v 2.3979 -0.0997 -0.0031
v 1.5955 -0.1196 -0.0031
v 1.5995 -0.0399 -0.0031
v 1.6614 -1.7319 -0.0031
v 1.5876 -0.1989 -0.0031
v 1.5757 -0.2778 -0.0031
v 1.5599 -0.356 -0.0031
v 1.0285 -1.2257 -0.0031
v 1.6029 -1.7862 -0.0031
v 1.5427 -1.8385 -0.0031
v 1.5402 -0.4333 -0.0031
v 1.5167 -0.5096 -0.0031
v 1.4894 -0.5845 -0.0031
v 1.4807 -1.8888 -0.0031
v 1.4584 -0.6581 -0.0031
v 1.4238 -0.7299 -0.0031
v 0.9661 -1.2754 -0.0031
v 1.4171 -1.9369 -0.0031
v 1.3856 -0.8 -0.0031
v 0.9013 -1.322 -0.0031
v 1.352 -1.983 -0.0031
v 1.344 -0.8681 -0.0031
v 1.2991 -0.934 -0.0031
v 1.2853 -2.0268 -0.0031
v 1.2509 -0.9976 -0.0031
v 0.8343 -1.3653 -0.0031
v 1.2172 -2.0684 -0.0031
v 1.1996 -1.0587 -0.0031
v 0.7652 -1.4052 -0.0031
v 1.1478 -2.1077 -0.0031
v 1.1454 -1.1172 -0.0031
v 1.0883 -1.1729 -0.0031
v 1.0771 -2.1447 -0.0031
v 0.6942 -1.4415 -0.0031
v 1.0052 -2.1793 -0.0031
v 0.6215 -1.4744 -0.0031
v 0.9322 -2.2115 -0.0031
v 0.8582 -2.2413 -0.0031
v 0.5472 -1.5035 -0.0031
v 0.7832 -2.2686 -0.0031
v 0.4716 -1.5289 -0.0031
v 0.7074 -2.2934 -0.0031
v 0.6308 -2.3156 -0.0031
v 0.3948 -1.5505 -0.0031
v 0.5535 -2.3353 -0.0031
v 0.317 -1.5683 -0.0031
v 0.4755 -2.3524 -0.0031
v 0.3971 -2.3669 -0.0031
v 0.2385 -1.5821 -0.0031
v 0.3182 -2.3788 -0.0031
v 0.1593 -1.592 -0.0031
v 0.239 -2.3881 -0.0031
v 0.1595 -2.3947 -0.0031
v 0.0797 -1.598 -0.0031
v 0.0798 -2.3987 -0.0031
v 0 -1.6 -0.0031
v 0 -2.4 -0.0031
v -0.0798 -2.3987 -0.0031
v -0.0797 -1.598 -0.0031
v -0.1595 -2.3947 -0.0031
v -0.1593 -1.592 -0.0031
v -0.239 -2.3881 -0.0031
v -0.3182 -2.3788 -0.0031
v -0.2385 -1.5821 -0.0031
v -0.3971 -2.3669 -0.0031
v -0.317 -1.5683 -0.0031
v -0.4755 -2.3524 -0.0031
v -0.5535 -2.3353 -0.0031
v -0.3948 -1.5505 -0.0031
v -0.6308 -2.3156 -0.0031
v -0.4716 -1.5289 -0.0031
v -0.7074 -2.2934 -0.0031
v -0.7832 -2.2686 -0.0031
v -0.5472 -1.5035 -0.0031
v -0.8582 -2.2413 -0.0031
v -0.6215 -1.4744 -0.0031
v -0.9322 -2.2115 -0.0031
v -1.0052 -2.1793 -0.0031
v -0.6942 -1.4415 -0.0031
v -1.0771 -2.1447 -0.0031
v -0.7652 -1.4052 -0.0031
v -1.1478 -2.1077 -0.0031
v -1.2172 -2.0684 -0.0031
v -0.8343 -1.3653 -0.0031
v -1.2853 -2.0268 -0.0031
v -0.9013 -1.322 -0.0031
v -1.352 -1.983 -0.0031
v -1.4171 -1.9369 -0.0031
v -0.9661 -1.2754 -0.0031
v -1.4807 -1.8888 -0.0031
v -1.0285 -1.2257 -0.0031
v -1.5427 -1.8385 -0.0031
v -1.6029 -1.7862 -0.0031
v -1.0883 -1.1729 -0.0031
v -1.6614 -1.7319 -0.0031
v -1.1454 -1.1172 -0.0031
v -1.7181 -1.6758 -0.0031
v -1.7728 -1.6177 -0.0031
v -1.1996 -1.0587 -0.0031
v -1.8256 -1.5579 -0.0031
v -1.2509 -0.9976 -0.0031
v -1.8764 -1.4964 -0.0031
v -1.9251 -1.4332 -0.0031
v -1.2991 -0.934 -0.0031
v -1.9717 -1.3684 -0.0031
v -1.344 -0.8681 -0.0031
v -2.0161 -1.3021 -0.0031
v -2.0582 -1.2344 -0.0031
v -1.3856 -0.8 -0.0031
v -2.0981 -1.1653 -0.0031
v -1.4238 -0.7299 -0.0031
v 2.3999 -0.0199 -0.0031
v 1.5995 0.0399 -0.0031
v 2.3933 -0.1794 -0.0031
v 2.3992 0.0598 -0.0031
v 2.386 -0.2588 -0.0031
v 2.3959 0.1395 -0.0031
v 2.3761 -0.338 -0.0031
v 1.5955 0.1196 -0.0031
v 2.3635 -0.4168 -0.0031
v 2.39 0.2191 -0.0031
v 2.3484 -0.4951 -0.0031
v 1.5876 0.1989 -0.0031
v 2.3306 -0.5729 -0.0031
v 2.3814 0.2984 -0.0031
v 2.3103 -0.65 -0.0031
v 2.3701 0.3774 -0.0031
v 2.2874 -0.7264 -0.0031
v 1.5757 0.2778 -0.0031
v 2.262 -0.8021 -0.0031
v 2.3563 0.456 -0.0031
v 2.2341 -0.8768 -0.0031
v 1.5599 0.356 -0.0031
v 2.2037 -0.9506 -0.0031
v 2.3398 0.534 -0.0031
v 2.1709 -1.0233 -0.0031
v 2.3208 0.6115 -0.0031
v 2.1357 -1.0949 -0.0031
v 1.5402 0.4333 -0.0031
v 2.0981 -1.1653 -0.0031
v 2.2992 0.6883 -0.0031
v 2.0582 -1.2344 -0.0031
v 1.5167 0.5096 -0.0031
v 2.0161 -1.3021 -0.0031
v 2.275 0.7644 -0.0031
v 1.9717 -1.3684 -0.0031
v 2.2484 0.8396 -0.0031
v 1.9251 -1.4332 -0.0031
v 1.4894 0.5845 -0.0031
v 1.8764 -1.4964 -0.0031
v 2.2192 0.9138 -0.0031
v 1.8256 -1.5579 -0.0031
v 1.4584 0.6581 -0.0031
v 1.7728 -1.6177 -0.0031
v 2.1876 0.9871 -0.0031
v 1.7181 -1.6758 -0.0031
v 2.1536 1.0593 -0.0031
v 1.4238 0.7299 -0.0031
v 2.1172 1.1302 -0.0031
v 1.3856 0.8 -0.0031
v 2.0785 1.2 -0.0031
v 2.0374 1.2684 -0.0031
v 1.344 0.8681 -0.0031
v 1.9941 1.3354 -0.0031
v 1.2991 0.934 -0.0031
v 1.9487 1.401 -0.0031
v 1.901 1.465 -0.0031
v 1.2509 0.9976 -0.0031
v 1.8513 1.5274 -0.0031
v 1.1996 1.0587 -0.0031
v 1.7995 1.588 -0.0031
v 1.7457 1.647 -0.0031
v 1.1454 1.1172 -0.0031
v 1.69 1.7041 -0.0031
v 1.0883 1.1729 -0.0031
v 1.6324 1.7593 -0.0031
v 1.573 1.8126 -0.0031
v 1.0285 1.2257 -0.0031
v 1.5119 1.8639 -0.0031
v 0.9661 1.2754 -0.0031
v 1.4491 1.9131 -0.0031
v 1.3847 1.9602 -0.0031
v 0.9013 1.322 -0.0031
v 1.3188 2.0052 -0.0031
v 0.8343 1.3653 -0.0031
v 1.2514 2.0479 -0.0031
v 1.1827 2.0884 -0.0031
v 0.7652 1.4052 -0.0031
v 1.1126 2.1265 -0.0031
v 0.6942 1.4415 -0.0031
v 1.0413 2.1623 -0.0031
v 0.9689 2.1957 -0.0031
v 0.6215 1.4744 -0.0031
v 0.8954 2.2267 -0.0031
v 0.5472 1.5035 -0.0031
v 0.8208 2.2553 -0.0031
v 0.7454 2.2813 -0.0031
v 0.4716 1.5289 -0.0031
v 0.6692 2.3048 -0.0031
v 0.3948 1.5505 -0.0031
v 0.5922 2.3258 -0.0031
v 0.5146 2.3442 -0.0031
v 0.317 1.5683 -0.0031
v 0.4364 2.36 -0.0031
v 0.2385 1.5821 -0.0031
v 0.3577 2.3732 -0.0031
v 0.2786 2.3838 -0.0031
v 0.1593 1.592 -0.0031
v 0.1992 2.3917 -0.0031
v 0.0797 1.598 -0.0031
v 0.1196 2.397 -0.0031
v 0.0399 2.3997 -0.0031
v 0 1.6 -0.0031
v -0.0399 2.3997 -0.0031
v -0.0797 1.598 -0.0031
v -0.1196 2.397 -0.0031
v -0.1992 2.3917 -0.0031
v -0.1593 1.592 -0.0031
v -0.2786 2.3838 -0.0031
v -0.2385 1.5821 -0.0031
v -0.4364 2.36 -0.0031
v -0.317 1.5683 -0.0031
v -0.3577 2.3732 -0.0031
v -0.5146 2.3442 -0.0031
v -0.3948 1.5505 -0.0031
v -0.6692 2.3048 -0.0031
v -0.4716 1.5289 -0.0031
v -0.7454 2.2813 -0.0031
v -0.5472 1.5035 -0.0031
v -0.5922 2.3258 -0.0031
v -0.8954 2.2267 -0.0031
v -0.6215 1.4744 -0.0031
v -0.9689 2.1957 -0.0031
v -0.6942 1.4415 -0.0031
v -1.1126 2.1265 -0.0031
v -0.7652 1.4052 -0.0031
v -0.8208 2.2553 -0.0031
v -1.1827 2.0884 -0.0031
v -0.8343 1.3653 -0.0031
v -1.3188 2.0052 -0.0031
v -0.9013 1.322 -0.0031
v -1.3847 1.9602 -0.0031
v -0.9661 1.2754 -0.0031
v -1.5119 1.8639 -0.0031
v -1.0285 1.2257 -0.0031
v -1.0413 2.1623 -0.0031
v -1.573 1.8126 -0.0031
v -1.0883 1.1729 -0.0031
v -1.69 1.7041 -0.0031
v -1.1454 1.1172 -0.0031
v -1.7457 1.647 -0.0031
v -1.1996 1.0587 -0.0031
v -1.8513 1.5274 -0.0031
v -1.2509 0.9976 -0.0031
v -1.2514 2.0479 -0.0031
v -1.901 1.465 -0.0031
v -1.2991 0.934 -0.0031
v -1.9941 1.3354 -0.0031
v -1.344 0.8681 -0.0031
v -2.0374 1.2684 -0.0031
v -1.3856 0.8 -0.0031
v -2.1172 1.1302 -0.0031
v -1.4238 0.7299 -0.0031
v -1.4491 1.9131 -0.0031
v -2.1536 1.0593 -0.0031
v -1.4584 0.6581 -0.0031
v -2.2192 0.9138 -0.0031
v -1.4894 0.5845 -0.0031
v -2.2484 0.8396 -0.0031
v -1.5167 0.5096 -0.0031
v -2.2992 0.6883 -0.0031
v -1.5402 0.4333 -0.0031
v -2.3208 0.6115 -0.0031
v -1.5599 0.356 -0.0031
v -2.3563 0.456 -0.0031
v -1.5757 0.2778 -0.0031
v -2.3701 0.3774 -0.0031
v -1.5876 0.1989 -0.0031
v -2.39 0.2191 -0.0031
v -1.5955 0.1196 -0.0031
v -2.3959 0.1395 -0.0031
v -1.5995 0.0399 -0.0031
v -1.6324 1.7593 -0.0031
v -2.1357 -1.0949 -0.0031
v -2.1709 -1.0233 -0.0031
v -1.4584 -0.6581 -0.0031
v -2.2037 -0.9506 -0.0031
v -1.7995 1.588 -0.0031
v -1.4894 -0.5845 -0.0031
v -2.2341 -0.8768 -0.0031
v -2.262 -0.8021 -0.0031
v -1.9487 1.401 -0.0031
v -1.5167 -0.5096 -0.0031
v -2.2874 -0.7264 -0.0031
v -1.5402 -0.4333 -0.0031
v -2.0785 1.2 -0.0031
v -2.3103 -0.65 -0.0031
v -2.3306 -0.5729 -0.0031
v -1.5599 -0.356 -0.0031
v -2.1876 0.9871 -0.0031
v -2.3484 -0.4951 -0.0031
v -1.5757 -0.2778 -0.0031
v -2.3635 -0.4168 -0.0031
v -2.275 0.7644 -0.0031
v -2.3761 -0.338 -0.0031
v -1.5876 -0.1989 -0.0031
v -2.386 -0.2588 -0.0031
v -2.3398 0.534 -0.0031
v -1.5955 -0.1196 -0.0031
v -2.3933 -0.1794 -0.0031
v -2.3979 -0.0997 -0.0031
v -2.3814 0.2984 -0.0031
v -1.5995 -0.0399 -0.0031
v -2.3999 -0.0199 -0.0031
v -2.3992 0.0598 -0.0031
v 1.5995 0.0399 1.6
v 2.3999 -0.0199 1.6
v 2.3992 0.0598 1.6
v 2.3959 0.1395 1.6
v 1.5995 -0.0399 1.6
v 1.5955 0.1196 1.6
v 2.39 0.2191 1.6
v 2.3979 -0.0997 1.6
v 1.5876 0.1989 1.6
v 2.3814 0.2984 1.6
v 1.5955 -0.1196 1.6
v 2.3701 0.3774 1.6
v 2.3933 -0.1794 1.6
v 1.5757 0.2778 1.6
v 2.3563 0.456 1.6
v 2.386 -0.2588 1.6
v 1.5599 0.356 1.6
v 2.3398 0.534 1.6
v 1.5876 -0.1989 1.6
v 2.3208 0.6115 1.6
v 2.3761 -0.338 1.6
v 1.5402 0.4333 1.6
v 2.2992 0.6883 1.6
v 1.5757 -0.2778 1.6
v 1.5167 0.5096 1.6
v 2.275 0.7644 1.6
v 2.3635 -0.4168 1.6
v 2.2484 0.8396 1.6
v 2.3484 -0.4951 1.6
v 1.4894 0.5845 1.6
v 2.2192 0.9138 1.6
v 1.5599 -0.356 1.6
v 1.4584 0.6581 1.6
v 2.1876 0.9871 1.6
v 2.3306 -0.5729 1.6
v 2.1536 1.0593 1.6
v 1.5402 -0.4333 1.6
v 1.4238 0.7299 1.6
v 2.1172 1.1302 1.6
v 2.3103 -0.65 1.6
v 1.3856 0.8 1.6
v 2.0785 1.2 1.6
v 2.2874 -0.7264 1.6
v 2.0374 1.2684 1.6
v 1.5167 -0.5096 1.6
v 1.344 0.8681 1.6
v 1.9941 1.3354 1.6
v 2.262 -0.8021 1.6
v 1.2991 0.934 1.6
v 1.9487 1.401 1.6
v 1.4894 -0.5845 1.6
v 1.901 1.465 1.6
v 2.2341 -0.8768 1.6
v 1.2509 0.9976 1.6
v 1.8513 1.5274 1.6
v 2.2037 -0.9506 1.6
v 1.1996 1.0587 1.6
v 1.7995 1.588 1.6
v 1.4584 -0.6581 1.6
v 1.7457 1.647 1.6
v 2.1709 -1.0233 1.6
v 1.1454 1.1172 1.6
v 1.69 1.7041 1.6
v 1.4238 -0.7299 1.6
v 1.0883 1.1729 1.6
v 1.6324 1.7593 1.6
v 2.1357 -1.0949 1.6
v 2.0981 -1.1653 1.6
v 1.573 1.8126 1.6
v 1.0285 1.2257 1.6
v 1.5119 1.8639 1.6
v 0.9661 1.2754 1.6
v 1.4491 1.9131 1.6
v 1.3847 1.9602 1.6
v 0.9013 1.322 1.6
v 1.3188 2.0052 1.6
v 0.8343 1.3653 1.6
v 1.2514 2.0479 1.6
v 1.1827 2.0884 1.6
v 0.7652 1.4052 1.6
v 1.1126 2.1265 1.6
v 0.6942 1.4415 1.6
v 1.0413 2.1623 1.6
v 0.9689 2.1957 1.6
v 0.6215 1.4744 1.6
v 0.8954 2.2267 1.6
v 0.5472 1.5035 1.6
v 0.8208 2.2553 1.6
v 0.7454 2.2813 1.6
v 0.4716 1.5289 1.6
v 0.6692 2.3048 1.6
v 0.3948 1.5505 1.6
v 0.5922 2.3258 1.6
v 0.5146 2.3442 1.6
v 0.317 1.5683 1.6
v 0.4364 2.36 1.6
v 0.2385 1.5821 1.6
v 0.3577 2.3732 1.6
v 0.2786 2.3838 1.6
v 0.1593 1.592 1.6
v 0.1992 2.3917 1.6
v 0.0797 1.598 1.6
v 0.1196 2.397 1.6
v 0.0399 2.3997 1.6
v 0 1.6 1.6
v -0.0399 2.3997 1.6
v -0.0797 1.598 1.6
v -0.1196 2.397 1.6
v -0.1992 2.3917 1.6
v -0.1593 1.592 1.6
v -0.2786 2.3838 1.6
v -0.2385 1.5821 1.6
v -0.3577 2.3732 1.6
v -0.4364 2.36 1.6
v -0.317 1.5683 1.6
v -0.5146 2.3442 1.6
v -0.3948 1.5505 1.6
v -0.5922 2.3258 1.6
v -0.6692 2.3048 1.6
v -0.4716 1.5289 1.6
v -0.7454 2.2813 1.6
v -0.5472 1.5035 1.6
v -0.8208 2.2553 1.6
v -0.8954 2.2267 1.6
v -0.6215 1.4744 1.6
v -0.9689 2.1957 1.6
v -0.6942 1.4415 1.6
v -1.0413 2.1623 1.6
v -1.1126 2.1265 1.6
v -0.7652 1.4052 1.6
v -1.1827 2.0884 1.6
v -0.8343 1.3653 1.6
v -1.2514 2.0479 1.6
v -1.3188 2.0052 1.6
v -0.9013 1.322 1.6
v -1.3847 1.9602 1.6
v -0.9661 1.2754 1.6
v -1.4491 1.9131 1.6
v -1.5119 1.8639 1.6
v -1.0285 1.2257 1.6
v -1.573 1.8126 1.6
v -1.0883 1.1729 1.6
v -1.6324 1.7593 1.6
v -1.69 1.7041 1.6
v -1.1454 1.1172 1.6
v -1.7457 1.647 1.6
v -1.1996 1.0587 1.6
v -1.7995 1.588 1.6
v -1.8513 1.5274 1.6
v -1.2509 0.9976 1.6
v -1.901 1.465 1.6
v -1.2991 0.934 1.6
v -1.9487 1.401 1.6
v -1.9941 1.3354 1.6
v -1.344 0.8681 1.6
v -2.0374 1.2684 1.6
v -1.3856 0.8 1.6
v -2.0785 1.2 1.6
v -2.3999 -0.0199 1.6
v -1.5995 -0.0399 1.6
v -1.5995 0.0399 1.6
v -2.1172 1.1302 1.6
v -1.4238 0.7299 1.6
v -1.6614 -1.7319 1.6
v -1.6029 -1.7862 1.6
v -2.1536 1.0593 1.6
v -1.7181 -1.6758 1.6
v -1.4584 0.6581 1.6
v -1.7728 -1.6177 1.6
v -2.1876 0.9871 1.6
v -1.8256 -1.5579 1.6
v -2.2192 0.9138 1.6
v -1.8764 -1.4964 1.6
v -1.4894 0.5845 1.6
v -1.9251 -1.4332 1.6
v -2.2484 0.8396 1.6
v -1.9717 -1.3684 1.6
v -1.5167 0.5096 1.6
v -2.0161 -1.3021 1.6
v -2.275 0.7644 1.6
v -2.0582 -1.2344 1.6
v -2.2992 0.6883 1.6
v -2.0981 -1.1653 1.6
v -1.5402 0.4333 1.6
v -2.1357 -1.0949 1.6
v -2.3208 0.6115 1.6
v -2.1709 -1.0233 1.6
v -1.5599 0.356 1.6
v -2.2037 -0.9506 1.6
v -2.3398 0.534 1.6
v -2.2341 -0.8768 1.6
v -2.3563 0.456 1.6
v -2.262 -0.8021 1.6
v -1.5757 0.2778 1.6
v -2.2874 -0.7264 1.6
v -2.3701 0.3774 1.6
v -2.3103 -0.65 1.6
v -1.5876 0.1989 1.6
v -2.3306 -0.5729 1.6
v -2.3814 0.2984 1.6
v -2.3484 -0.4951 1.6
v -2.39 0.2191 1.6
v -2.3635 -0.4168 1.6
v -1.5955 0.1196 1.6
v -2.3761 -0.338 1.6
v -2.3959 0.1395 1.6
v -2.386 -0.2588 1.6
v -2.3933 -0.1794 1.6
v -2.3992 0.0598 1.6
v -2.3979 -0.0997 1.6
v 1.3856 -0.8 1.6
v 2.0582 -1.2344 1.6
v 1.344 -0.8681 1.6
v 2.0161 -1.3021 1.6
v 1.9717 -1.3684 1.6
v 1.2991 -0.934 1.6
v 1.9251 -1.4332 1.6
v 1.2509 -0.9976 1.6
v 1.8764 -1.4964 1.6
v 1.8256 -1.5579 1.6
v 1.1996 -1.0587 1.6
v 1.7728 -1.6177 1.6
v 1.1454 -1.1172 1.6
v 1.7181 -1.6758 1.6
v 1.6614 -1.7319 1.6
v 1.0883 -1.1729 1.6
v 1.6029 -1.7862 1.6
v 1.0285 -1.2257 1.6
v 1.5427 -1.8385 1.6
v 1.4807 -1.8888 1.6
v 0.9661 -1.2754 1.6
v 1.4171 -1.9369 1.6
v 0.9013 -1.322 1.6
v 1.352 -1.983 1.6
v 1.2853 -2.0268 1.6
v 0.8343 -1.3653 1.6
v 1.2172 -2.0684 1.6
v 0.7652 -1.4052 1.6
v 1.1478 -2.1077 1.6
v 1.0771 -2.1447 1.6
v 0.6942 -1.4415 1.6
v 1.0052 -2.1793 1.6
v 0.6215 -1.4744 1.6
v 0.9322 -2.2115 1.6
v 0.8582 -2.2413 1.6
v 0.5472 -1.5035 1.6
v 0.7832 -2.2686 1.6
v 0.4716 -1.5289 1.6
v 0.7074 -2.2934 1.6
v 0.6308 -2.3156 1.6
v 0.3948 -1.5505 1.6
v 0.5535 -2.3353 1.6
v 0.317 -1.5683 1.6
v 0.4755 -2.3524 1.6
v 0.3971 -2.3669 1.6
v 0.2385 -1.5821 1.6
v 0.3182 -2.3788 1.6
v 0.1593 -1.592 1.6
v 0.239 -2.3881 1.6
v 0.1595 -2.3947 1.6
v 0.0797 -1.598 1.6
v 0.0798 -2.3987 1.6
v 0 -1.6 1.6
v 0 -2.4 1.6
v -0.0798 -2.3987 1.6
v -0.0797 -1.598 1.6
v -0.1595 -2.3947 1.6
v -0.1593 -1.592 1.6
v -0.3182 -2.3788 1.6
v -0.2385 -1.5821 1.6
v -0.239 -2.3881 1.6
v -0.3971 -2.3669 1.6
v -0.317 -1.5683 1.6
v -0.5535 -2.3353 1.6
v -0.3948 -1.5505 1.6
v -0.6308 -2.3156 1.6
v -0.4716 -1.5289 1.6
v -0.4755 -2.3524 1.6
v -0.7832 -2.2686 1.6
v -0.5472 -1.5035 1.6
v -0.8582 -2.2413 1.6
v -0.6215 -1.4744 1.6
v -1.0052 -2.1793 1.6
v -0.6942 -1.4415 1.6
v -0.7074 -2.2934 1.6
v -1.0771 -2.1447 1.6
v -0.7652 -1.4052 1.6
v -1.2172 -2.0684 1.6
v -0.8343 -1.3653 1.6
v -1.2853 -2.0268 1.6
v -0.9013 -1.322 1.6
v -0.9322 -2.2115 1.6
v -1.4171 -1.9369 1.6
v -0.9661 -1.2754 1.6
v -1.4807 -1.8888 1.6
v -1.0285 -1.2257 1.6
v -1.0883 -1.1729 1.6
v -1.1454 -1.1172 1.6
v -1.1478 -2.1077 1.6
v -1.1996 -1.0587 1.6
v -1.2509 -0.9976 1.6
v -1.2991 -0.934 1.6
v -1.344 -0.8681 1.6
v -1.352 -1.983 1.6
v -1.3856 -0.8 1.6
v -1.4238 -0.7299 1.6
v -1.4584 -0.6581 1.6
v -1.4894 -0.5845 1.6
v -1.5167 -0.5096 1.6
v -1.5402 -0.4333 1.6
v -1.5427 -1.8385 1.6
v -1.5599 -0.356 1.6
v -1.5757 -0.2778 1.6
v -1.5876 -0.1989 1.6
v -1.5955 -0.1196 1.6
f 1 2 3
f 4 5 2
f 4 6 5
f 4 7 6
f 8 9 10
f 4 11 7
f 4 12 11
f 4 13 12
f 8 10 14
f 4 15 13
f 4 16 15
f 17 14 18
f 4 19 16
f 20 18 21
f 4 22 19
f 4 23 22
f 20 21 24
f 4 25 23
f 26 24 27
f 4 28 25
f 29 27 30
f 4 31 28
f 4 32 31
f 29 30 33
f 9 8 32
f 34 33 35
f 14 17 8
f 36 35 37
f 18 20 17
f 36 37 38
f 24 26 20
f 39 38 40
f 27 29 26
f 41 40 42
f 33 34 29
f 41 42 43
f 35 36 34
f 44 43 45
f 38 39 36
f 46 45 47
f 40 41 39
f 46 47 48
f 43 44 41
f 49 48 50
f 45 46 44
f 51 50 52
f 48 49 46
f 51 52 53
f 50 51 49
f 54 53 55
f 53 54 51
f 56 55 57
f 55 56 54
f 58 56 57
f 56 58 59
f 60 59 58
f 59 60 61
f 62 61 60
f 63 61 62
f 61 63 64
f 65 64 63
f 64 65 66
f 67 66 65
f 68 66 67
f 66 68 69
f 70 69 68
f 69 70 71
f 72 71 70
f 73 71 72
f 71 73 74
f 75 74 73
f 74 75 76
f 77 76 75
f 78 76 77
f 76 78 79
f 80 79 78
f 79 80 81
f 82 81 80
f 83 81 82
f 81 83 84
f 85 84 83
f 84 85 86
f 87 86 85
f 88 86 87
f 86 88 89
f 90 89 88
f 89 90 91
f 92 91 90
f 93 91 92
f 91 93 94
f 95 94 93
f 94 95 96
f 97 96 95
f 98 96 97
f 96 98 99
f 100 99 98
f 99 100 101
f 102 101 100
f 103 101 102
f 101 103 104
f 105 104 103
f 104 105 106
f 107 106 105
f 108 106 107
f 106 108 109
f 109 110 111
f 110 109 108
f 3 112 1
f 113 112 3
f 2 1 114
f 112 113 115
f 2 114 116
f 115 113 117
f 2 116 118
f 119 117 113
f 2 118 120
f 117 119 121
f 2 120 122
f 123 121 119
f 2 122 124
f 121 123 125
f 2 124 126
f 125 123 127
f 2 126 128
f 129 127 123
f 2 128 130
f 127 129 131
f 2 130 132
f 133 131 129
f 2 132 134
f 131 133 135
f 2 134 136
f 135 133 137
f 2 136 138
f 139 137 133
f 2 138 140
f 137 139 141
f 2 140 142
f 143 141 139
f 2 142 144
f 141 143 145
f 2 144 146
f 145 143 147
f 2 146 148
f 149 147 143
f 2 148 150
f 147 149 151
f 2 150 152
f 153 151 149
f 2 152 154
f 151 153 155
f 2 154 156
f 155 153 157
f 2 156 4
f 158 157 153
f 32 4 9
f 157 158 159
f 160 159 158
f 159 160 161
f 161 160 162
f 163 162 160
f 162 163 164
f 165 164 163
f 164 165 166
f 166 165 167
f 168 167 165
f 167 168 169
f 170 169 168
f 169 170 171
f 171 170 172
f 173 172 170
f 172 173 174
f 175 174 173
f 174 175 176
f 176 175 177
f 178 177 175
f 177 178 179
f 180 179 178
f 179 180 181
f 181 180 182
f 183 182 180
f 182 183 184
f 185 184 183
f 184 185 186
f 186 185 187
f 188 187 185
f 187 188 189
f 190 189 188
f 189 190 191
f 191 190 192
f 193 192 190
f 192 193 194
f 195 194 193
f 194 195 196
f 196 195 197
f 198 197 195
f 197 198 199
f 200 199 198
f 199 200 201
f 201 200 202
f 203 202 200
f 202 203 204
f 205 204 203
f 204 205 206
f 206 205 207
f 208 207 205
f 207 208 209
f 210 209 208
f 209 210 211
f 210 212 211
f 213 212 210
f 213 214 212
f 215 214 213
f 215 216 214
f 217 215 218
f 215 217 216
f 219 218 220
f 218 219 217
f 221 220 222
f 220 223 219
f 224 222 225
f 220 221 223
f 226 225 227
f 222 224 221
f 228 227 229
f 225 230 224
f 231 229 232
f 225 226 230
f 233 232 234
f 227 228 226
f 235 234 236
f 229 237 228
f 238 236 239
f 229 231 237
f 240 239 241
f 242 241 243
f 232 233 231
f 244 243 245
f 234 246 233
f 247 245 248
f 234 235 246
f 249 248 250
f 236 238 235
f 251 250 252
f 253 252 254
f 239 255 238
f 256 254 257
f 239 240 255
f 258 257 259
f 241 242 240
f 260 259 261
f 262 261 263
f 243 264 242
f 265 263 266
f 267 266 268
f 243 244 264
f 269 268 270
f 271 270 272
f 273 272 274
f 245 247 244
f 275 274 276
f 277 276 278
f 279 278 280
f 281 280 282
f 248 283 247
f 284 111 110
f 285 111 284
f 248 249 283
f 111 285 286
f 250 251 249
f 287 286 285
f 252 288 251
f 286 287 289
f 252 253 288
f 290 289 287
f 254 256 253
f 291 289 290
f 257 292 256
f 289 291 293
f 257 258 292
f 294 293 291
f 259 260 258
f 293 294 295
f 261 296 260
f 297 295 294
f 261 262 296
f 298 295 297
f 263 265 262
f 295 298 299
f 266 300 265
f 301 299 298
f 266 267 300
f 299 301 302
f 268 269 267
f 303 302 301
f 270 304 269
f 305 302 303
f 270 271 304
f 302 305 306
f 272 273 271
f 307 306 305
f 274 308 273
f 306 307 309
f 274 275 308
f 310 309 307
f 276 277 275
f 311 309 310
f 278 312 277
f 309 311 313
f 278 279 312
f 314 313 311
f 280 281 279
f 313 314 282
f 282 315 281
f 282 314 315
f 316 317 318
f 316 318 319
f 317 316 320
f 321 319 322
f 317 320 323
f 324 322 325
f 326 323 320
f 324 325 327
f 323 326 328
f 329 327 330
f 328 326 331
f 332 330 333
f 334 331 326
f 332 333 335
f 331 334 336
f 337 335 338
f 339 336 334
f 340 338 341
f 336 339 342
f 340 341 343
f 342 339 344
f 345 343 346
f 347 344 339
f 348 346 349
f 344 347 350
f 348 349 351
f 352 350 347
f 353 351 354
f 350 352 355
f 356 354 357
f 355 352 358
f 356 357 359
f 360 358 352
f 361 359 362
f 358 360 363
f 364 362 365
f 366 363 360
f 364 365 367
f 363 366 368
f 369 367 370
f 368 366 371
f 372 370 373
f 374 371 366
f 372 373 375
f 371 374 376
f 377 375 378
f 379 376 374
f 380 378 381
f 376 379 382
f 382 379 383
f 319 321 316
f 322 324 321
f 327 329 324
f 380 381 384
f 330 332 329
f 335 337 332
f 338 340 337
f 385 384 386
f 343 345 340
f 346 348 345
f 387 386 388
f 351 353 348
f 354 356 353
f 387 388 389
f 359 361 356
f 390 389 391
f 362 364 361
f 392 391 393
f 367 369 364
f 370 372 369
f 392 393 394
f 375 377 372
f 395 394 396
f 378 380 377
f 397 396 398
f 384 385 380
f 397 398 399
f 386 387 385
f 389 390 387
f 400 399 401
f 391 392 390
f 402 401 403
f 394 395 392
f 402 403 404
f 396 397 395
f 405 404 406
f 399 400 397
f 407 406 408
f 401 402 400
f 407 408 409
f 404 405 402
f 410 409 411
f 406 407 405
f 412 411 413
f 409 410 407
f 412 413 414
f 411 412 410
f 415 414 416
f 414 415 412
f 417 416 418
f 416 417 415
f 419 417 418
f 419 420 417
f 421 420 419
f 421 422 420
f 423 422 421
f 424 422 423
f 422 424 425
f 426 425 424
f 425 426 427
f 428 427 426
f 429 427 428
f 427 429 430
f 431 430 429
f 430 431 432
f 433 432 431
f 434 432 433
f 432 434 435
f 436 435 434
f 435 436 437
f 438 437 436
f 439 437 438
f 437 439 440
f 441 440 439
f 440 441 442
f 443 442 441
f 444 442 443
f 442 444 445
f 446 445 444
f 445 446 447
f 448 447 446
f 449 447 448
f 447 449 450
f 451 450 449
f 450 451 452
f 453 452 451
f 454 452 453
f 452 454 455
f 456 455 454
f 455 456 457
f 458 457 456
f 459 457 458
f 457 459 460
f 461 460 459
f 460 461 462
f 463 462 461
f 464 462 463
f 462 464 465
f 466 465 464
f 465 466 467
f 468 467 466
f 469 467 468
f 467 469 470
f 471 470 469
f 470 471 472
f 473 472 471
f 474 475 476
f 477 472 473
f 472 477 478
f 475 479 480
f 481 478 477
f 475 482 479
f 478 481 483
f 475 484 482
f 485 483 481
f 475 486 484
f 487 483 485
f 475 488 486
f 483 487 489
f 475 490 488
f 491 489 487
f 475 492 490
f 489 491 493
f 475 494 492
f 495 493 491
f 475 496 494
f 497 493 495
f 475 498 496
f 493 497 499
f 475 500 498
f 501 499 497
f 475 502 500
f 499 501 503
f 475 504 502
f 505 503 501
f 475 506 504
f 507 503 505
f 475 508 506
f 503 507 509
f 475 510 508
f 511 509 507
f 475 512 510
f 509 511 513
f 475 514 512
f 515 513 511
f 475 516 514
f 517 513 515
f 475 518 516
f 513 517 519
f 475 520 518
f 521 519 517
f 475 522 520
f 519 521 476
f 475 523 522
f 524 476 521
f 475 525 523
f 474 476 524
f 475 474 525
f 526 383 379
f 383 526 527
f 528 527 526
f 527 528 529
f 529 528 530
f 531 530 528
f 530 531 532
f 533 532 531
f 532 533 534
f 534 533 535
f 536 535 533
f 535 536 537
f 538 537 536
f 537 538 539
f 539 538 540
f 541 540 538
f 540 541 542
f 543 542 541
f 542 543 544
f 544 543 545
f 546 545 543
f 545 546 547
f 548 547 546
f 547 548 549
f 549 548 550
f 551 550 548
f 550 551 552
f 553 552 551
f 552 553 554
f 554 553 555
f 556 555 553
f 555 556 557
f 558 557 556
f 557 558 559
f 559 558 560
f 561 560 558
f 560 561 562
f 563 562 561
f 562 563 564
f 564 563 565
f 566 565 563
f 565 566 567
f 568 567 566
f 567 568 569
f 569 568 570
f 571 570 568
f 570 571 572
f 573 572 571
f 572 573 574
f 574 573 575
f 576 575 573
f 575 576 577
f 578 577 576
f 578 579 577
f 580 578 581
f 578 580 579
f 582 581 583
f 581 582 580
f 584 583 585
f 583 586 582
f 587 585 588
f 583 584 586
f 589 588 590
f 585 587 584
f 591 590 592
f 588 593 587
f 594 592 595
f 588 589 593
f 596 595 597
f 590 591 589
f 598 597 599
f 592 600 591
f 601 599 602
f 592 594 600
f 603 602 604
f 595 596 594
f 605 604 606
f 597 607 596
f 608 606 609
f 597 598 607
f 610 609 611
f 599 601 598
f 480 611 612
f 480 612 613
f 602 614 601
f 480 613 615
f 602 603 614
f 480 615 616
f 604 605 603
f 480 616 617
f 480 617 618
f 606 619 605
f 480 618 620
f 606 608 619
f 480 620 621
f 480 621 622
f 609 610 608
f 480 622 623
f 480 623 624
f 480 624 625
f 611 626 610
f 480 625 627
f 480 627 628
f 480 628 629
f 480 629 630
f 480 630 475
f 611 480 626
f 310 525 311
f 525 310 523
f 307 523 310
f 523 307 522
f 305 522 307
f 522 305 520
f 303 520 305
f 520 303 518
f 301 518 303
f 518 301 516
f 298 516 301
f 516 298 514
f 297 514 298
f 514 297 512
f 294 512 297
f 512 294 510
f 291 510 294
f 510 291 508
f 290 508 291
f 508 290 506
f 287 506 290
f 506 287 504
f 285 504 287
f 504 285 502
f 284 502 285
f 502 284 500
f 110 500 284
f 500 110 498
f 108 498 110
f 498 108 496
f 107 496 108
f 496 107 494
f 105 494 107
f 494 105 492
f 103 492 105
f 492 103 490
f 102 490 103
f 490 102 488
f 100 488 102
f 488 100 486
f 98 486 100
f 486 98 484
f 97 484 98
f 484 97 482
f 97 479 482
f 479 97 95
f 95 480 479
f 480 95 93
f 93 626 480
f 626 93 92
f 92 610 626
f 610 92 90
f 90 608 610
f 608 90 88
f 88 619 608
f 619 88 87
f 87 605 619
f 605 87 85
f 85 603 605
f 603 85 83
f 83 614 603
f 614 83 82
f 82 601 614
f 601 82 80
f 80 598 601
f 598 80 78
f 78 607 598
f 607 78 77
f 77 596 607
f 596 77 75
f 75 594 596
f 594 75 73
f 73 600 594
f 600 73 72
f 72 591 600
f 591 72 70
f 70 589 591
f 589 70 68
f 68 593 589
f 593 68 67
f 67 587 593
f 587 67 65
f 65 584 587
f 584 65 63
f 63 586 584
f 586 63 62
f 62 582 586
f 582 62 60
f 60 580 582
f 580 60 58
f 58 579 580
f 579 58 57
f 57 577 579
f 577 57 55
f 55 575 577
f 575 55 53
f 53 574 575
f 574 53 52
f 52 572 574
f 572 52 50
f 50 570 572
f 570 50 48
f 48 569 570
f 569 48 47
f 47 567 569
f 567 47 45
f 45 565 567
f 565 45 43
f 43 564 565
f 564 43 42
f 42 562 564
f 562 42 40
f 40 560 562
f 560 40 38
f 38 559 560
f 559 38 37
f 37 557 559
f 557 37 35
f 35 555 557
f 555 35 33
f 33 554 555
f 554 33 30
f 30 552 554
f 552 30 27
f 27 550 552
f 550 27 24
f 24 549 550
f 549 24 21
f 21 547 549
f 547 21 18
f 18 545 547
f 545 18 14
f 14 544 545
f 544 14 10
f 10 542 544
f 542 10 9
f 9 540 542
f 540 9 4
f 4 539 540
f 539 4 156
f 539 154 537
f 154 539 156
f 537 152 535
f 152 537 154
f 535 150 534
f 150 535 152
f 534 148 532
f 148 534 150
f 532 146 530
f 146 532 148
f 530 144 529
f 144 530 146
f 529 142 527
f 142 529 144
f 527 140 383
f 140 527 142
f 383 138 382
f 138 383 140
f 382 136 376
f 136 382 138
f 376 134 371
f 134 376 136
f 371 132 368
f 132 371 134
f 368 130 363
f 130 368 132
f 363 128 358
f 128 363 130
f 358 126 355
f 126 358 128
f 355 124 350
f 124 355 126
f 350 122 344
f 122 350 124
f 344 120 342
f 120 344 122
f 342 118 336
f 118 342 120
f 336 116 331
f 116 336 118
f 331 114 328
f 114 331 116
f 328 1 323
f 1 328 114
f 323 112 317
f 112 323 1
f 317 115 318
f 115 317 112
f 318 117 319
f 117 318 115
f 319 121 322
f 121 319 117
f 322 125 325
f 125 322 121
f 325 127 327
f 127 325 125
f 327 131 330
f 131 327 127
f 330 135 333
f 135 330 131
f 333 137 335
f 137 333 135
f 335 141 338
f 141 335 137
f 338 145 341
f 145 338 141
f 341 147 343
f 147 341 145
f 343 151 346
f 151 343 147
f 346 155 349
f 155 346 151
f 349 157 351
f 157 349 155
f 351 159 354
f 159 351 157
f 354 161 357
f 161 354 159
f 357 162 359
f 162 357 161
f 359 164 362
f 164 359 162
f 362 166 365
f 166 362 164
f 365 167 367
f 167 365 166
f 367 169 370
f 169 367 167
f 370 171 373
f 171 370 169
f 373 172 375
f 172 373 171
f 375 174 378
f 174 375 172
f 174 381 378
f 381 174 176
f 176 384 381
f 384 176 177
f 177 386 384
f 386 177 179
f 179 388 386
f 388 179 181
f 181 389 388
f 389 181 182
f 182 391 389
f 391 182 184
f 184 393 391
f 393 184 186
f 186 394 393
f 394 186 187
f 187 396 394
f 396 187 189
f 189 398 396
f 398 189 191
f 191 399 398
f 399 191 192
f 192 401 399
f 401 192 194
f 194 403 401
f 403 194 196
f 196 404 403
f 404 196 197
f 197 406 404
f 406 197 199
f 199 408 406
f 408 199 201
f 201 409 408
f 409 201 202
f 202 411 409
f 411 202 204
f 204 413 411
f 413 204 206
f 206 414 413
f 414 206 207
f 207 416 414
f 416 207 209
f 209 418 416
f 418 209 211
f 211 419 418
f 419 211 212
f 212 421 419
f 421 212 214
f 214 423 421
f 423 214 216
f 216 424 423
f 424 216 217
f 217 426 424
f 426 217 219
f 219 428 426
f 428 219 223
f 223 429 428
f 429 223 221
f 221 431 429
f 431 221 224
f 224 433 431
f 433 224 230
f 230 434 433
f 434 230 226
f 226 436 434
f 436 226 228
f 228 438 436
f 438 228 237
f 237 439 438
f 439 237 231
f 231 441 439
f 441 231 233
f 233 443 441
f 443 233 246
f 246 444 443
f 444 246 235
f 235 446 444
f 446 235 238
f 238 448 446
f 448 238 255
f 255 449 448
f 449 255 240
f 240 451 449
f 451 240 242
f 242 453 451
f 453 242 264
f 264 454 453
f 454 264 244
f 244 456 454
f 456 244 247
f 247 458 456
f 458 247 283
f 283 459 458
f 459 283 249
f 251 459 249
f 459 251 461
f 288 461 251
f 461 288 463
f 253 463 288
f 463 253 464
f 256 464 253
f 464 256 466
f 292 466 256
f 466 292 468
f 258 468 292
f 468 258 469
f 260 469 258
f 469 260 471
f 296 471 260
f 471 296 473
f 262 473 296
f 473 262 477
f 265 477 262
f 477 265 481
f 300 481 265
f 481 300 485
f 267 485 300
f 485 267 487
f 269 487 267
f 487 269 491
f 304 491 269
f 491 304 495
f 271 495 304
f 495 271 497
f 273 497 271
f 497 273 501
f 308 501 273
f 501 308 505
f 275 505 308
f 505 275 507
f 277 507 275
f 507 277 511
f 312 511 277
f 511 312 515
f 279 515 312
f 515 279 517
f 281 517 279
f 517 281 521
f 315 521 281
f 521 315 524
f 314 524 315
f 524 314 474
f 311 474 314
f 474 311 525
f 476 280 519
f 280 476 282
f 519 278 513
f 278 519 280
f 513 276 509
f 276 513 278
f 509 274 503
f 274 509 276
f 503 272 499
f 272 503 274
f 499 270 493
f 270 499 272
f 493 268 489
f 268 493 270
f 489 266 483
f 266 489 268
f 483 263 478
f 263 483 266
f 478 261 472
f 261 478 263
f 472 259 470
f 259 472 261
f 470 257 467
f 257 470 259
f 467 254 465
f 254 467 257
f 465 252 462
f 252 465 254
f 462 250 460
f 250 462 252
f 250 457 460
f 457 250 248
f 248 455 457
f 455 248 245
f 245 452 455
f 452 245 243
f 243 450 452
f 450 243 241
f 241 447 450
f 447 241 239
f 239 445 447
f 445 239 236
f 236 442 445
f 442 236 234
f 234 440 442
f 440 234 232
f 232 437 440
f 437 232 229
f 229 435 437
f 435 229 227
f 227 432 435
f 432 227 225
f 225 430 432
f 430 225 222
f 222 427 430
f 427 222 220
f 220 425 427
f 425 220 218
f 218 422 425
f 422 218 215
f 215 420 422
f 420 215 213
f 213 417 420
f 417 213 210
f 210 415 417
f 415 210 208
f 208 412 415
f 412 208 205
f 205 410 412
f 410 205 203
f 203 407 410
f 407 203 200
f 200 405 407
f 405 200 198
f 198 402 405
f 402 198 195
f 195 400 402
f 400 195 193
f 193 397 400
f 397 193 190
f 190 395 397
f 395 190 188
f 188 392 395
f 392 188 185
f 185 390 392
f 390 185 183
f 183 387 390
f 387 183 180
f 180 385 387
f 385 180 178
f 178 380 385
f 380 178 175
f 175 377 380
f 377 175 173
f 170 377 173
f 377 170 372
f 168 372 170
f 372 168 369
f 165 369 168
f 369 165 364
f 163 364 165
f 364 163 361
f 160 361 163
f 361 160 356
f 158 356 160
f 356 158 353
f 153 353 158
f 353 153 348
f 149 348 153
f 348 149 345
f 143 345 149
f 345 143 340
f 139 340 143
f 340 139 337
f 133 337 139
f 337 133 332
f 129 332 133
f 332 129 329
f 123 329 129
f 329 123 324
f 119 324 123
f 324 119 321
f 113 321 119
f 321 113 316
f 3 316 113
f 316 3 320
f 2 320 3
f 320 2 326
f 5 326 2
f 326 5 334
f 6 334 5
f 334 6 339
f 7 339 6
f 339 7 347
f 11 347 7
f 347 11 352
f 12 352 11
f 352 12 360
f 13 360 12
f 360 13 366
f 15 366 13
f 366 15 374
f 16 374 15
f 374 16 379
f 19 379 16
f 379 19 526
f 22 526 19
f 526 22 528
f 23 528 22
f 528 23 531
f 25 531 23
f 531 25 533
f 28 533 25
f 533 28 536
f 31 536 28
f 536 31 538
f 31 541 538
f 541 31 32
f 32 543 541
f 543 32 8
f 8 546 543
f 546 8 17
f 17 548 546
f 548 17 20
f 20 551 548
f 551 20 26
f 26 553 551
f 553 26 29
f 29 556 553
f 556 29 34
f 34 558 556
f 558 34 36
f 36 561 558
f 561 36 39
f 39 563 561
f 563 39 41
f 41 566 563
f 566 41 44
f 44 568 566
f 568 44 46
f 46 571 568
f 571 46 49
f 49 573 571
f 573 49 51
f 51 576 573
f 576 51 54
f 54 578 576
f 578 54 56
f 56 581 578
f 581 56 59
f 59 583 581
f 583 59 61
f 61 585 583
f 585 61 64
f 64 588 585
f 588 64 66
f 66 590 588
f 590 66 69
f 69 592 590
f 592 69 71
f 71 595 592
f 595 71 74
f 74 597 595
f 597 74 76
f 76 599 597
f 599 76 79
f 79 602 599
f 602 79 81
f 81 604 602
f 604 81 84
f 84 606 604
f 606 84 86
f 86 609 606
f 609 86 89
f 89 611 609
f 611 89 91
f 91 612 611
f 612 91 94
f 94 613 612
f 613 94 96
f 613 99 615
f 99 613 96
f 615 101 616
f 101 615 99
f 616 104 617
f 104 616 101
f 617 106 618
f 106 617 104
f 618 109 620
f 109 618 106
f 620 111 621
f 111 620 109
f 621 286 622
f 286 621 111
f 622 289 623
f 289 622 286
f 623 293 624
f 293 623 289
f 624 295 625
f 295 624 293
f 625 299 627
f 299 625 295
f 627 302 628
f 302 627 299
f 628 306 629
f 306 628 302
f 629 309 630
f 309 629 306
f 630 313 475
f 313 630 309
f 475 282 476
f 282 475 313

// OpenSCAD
use <../lib.scad>
use <3087c.scad>
$fa=1; $fs=0.2;
function ldraw_lib__39(realsolid=false) = [
// 0 ~Moved to 3087c
// 0 Name: 39.dat
// 0 Author: [PTadmin]
// 0 !LDRAW_ORG Part UPDATE 2009-01
// 0 !LICENSE Licensed under CC BY 4.0 : see CAreadme.txt
// 
// 0 BFC CERTIFY CCW
  [0,"BFC","CERTIFY"],
  [0,"BFC","CCW"],
// 
// 0 !HISTORY 2007-06-30 [PTadmin] Header formatted for Contributor Agreement
// 0 !HISTORY 2008-07-01 [PTadmin] Official Update 2008-01
// 0 !HISTORY 2008-12-03 [PTadmin] Moved to 3087c
// 0 !HISTORY 2009-05-02 [PTadmin] Official Update 2009-01
// 
// 
// 1 16 0 0 0 1 0 0 0 1 0 0 0 1 3087c.dat
  [1,16,0,0,0,1,0,0,0,1,0,0,0,1, ldraw_lib__3087c(realsolid)],
];
module ldraw_lib__39(step=0, col=false, unit=2/5, alt=false, line=0.2, solid=!$preview)
    makepoly(ldraw_lib__39(solid), step=step, col=col, unit=unit, alt=alt, line=line, solid=solid);
ldraw_lib__39(line=0.2);
